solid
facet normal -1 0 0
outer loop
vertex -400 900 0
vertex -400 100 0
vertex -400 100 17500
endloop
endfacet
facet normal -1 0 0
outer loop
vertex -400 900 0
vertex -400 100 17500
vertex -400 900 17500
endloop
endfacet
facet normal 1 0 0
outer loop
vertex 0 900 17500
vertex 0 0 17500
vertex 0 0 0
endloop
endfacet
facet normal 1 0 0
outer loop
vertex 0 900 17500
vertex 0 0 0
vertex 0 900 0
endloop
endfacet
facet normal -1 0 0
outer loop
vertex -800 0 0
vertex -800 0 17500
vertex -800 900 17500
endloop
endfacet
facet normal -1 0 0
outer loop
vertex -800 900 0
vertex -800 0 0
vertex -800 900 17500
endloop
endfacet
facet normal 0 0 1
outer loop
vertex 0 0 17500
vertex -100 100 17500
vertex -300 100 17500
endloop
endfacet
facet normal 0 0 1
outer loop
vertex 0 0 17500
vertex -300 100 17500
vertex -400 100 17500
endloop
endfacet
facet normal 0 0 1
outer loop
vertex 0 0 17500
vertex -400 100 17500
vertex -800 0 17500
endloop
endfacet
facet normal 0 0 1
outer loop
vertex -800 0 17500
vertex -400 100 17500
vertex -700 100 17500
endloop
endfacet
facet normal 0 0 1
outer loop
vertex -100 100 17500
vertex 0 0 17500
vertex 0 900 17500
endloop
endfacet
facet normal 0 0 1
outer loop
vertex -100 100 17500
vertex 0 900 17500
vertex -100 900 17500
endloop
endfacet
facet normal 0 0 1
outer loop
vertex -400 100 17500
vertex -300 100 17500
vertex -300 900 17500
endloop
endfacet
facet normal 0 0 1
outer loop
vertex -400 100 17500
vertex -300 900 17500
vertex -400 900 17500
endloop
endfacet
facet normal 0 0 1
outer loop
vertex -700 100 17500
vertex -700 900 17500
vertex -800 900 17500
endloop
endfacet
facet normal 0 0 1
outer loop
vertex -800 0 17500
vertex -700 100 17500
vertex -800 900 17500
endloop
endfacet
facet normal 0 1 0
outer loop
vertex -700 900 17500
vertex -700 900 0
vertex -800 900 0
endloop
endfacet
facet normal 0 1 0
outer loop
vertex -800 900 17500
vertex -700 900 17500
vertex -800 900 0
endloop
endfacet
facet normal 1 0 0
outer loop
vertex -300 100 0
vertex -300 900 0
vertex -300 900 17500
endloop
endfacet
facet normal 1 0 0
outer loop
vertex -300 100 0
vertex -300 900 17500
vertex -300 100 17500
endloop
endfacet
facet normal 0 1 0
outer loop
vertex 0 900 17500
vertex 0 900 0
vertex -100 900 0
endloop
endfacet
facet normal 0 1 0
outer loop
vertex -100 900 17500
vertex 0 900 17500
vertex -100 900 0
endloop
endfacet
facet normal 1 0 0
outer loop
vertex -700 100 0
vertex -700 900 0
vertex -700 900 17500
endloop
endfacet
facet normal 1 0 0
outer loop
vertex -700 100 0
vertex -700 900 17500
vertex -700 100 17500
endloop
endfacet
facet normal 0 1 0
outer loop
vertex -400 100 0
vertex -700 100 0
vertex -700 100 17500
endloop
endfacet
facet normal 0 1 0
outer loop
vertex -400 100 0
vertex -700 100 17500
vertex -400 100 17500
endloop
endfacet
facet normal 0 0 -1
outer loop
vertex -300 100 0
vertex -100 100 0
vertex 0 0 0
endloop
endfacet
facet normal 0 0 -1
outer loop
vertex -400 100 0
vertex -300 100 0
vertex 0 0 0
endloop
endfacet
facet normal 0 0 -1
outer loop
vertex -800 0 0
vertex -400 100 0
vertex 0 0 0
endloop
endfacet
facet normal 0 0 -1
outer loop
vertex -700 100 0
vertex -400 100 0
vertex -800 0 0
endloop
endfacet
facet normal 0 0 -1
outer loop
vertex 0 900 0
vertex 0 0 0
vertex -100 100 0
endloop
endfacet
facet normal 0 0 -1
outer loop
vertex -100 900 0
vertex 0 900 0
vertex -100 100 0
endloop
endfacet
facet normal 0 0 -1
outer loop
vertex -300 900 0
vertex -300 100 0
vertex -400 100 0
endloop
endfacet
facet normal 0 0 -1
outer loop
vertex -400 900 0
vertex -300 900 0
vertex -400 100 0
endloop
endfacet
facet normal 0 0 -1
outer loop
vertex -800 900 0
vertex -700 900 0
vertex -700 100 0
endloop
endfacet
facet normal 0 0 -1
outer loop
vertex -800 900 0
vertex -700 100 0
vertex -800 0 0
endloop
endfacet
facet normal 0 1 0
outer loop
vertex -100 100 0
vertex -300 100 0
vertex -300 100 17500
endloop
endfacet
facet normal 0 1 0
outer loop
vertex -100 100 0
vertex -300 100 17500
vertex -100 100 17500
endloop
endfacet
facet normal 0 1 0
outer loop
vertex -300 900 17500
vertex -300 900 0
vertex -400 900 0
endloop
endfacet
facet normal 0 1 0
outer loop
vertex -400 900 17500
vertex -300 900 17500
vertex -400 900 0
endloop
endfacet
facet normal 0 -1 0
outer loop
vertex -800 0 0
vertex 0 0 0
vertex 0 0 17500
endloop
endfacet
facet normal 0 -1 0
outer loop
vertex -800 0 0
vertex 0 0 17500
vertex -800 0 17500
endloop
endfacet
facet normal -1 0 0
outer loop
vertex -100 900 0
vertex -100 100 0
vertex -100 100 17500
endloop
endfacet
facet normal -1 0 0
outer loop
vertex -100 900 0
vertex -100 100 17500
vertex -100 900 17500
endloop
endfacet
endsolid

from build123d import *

# Parameters (mm, degrees)
SALIENTE_EXTRUIR1_DEPTH = 17500
CROQUIS2_W              = 100
CROQUIS2_H              = 300
SALIENTE_EXTRUIR2_DEPTH = 17500


with BuildPart() as part:
    # Croquis1 → Saliente-Extruir1 (new body)
    with BuildSketch(Plane.XY):
        Polygon((0, 0), (-800, 0), (-800, 600), (-700, 600), (-700, 100), (-400, 100), (-400, 470), (-300, 470), (-300, 100), (-100, 100), (-100, 600), (0, 600), align=None)
    extrude(amount=SALIENTE_EXTRUIR1_DEPTH)

    # Croquis2 → Saliente-Extruir2 (add)
    with BuildSketch(Plane(origin=(0, 0, 0), x_dir=(-1, 0, 0), z_dir=(0, 0, -1))):
        with Locations((50, 750)):
            Rectangle(CROQUIS2_W, CROQUIS2_H)
        with Locations((750, 750)):
            Rectangle(CROQUIS2_W, CROQUIS2_H)
        Polygon((400, 600), (400, 470), (300, 470), (300, 900), (400, 900), align=None)
    extrude(amount=-SALIENTE_EXTRUIR2_DEPTH)


solid = part.part
